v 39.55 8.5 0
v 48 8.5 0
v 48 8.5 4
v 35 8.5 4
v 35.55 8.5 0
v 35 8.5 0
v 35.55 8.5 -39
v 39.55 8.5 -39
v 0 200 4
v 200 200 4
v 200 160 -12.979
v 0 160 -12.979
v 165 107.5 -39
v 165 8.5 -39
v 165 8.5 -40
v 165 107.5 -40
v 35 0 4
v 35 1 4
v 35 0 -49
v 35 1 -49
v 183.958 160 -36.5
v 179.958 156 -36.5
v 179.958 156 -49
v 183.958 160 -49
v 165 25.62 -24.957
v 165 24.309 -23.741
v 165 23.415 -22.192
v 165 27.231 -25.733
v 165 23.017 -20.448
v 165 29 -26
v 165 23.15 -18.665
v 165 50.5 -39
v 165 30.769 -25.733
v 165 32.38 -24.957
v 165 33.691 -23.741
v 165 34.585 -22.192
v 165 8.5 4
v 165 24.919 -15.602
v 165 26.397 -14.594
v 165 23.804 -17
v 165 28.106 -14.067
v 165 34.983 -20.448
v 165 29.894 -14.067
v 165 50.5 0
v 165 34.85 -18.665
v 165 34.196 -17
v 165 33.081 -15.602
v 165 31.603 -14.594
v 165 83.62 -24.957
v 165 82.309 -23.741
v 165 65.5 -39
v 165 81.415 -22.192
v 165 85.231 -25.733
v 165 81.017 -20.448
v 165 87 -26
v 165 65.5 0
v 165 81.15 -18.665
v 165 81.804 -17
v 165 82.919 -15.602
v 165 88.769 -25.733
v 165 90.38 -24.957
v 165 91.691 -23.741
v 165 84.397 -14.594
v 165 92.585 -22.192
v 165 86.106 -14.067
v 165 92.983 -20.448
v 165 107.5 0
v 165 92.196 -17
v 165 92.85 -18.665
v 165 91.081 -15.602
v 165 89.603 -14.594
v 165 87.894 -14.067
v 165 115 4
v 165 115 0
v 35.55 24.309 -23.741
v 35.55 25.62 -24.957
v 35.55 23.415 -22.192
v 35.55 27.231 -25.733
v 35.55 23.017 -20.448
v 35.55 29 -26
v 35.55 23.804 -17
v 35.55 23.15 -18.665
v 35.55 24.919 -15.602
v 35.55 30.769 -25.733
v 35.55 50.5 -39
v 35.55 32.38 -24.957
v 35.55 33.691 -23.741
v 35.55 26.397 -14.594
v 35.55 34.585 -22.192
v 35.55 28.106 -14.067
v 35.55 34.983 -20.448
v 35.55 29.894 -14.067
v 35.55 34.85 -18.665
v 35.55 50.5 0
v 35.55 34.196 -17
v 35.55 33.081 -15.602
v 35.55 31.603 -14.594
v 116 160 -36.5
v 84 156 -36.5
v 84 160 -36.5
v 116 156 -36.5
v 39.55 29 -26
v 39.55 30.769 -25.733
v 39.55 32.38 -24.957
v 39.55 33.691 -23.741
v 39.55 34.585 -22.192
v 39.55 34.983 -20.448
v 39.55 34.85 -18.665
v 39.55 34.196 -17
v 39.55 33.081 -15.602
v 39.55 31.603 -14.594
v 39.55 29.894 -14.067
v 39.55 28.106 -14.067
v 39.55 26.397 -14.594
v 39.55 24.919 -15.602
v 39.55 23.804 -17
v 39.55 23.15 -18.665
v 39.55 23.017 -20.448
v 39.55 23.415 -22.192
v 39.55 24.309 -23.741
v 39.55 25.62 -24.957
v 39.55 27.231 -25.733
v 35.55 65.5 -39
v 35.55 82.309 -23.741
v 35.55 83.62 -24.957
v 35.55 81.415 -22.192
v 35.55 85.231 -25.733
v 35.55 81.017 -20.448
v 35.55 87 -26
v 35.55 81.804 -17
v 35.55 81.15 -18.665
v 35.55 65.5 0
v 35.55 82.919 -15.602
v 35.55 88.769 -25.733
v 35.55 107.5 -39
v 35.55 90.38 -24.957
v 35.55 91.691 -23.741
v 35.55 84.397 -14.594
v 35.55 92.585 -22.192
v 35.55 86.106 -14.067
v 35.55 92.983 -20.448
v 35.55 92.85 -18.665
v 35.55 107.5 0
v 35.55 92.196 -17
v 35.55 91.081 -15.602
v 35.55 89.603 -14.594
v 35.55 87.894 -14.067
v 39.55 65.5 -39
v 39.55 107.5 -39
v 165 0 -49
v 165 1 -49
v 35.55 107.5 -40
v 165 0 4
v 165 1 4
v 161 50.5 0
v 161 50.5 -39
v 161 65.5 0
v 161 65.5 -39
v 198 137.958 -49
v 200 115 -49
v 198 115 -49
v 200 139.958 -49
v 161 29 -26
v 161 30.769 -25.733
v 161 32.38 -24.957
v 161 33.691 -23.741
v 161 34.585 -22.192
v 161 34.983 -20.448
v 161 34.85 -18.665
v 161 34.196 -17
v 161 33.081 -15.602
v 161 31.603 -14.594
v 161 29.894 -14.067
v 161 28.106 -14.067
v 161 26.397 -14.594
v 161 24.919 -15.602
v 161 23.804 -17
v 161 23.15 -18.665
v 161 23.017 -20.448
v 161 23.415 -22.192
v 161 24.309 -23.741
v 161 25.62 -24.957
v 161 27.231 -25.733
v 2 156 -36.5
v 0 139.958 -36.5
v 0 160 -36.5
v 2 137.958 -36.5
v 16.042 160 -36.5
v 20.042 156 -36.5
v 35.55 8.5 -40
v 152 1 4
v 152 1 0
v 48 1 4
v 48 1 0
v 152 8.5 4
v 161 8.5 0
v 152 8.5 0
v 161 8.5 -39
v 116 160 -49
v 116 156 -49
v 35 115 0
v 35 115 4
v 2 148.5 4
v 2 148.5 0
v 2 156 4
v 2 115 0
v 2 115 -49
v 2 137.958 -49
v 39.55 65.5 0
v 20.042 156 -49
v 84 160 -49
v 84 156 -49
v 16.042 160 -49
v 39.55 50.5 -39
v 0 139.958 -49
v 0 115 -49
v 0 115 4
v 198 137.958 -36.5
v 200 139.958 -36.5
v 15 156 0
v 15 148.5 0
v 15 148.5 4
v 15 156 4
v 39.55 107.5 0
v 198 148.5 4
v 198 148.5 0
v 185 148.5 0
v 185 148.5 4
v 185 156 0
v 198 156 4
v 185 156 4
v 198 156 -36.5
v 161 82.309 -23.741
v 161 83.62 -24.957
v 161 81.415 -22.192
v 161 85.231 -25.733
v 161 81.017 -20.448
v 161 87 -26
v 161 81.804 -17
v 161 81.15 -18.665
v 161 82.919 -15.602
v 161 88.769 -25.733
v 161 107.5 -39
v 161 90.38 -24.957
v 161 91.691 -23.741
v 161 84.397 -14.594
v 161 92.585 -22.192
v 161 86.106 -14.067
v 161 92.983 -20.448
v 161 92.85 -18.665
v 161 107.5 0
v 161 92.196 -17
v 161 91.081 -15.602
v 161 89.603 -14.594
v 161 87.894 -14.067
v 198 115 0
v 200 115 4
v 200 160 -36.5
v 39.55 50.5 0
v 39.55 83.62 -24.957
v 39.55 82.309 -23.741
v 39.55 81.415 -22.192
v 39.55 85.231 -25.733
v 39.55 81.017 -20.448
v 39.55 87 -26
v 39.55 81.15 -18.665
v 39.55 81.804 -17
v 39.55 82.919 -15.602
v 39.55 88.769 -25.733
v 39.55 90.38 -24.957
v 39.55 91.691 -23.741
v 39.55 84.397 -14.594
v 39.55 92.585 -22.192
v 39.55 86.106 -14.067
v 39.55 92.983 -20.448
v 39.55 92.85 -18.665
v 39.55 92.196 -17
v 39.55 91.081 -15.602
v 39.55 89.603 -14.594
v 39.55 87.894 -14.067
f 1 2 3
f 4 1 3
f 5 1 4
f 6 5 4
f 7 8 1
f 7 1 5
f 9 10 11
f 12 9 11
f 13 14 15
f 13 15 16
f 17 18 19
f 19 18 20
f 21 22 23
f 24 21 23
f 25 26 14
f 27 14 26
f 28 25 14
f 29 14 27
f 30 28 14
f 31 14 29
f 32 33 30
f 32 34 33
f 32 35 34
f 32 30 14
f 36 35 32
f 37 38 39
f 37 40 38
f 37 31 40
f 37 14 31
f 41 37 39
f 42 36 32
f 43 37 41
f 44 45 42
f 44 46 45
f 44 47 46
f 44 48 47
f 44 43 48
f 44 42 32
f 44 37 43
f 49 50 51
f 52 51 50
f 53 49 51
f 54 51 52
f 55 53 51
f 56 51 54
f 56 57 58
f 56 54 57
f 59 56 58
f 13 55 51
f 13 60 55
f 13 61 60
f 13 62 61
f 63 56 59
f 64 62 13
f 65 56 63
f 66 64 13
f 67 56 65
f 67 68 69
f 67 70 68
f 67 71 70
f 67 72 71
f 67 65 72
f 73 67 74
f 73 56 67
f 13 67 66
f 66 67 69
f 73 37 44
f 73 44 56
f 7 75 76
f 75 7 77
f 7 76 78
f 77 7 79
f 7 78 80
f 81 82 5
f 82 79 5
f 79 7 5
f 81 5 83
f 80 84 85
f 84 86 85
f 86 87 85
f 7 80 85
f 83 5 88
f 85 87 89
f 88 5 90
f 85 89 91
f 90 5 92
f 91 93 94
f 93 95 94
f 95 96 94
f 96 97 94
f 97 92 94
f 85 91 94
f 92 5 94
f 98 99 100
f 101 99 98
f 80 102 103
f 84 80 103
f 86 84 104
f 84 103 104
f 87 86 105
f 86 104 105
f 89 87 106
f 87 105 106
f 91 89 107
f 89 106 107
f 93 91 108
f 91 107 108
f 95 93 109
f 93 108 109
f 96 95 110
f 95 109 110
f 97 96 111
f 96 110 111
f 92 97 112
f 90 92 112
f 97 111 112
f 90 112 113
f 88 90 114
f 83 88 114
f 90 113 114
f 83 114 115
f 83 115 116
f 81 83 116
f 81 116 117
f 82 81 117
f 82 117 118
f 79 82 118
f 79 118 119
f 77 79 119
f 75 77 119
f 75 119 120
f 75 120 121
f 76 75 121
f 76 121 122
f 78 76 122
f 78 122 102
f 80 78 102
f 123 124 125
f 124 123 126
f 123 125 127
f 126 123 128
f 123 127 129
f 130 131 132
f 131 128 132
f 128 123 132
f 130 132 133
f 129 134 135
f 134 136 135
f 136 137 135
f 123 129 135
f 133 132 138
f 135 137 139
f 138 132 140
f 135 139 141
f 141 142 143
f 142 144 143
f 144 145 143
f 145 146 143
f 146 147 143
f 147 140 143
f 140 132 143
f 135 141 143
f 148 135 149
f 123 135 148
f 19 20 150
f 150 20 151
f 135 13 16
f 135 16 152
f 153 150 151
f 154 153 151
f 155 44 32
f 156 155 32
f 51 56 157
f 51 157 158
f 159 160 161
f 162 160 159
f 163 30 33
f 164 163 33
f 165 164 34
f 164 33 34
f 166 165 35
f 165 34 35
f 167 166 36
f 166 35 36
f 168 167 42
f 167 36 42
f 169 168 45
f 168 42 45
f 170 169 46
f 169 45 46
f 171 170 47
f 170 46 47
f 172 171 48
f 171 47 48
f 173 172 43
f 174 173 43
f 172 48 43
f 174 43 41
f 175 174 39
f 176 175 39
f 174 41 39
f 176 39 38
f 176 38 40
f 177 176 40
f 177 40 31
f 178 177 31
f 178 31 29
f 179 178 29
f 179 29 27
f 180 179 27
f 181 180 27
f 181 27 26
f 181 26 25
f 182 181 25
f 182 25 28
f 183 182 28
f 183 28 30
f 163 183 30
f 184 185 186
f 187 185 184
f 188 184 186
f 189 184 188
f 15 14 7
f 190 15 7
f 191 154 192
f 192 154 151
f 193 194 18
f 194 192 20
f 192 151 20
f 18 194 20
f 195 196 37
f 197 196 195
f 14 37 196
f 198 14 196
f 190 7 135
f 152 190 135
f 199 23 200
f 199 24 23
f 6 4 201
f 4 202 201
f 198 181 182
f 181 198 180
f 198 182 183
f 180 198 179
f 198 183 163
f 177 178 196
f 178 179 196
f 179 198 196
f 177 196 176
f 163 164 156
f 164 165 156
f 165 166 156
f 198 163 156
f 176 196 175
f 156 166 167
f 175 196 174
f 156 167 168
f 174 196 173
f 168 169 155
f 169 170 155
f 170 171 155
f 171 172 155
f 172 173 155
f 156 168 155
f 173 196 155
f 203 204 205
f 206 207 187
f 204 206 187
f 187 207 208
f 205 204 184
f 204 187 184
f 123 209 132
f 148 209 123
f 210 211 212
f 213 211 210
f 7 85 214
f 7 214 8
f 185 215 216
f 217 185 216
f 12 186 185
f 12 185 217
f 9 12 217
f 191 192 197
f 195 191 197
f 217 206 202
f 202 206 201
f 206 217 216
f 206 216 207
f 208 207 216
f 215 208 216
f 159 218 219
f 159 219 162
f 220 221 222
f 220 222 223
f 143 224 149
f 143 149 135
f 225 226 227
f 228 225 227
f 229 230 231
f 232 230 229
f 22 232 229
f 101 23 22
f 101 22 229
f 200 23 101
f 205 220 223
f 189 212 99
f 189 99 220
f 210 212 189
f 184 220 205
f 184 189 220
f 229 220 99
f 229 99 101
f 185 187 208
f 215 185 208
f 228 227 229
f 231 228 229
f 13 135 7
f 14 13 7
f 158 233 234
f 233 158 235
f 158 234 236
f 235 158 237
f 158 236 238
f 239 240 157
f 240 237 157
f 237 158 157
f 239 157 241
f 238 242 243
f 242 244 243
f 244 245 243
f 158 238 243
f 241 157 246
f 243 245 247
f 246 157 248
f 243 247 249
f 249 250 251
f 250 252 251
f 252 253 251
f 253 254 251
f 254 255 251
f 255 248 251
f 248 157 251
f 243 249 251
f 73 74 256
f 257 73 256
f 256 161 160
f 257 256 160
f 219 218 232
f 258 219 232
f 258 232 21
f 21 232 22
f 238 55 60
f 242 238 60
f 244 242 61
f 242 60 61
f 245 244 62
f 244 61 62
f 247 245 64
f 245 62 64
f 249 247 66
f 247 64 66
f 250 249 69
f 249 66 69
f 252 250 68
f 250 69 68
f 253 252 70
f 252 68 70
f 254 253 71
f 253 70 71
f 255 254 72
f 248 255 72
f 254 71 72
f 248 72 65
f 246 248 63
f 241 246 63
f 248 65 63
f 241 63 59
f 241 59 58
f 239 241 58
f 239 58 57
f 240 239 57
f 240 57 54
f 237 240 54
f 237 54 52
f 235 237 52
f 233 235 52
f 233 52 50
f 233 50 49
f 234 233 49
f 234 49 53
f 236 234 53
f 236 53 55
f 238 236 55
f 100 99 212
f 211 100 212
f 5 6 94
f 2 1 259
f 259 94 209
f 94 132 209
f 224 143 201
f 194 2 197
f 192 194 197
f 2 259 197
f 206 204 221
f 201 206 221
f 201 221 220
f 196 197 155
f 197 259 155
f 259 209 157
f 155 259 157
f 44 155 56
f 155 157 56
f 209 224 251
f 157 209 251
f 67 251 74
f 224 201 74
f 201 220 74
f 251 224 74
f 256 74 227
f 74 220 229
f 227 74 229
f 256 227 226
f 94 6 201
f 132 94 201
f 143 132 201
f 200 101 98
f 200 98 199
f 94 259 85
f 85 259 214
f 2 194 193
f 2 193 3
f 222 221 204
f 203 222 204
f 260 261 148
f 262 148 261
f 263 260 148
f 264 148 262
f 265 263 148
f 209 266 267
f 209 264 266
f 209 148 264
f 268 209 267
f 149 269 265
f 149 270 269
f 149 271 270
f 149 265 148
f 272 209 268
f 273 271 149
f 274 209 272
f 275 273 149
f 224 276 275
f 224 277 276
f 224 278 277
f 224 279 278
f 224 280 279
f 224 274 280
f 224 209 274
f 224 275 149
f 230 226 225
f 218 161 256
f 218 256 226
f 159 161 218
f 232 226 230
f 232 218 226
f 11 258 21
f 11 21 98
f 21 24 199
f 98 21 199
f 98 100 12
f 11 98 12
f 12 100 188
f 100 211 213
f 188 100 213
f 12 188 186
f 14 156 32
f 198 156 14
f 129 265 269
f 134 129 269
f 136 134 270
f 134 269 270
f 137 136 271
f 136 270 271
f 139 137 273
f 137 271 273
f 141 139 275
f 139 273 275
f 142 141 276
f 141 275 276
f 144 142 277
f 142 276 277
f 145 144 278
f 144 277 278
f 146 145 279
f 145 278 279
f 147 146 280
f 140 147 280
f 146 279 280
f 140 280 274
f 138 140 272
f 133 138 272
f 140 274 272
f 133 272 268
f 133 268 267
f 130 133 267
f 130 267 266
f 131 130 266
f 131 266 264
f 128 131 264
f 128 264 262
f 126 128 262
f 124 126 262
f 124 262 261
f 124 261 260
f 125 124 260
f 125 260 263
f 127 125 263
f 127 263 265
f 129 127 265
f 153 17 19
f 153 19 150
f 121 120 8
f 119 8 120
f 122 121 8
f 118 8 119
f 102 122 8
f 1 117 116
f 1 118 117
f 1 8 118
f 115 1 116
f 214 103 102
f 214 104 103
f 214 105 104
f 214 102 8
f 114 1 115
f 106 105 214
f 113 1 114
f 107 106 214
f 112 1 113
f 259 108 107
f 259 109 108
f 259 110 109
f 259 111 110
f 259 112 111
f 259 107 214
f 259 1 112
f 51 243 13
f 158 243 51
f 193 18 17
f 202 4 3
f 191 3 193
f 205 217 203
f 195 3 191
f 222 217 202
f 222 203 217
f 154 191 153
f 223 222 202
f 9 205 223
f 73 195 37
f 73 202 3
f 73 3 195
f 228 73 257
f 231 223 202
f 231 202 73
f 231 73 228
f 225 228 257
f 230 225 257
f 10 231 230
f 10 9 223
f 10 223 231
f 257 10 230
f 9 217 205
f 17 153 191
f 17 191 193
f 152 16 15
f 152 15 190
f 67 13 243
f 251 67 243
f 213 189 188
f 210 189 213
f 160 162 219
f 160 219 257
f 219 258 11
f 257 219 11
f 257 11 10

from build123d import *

# Parameters (mm, degrees)
BOSS_EXTRUDE1_DEPTH     = 4
BOSS_EXTRUDE2_DEPTH     = 53
BOSS_EXTRUDE4_DEPTH     = 200
SKETCH5_W               = 25.514718625
SKETCH5_H               = 12.5
CUT_EXTRUDE1_DEPTH      = 20
SKETCH6_W               = 12.5
SKETCH6_H               = 25.514718626
CUT_EXTRUDE2_DEPTH      = 20
SKETCH7_W               = 32
SKETCH7_H               = 12.5
CUT_EXTRUDE3_DEPTH      = 8
CUT_EXTRUDE3_DEPTH_BACK = 6.482
BOSS_EXTRUDE5_DEPTH     = 4
SKETCH9_W               = 4
SKETCH9_H               = 99
BOSS_EXTRUDE6_DEPTH     = 39
SKETCH10_W              = 39
SKETCH10_H              = 15
CUT_EXTRUDE5_DEPTH      = 137
SKETCH12_W              = 35
SKETCH12_H              = 53
CUT_EXTRUDE6_DEPTH      = 8
SKETCH13_R              = 6
CUT_EXTRUDE7_DEPTH      = 135
SKETCH15_W              = 129.449663631
SKETCH15_H              = 99
BOSS_EXTRUDE7_DEPTH     = 1
SPLIT1_SURFACE_1_BACK   = 288.766
SPLIT1_SURFACE_1_DEPTH  = 577.532
SPLIT1_SURFACE_2_BACK   = 288.766
SPLIT1_SURFACE_2_DEPTH  = 577.532
SKETCH17_W              = 13
SKETCH17_H              = 7.5
CUT_EXTRUDE8_DEPTH      = 10


with BuildPart() as part:
    # Sketch1 → Boss-Extrude1 (new body)
    with BuildSketch(Plane.XY):
        Polygon((175.95836944, 160), (24.04163056, 160), (0, 135.95836944), (0, 115), (35, 115), (35, 60), (35, 55), (35, 0), (165, 0), (165, 55), (165, 60), (165, 115), (200, 115), (200, 135.95836944), align=None)
    extrude(amount=BOSS_EXTRUDE1_DEPTH)

    # Sketch3 → Boss-Extrude2 (add)
    with BuildSketch(Plane.XY.offset(4)):
        Polygon((0, 0), (200, 0), (200, 1), (199, 1), (1, 1), (0, 1), align=None)
        Polygon((0, 160), (200, 160), (200, 115), (198, 115), (198, 156), (2, 156), (2, 115), (0, 115), align=None)
    extrude(amount=-BOSS_EXTRUDE2_DEPTH)

    # Sketch4 → Boss-Extrude4 (add)
    with BuildSketch(Plane(origin=(200, 0, 0), x_dir=(0, 0, -1), z_dir=(1, 0, 0))):
        Polygon((-4, 160), (-4, 200), (12.978992648, 160), align=None)
    extrude(amount=-BOSS_EXTRUDE4_DEPTH)

    # Sketch5 → Cut-Extrude1 (cut)
    with BuildSketch(Plane(origin=(-67.97918472, 67.97918472, 0), x_dir=(0.7071067811865505, 0.7071067811865447, 0), z_dir=(-0.7071067811865447, 0.7071067811865505, 0))):
        with Locations((111.722871428, 42.75)):
            Rectangle(SKETCH5_W, SKETCH5_H)
    extrude(amount=CUT_EXTRUDE1_DEPTH, mode=Mode.SUBTRACT)

    # Sketch6 → Cut-Extrude2 (cut)
    with BuildSketch(Plane(origin=(167.97918472, 167.97918472, 0), x_dir=(0, 0, -1), z_dir=(0.7071067811865493, 0.7071067811865458, 0))):
        with Locations((42.75, -29.69848481)):
            Rectangle(SKETCH6_W, SKETCH6_H)
    extrude(amount=CUT_EXTRUDE2_DEPTH, mode=Mode.SUBTRACT)

    # Sketch7 → Cut-Extrude3 (cut, two sides)
    with BuildSketch(Plane(origin=(0, 155, 0), x_dir=(1, 0, 0), z_dir=(0, 1, 0))) as cut_extrude3_sk:
        with Locations((100, 42.75)):
            Rectangle(SKETCH7_W, SKETCH7_H)
    extrude(amount=CUT_EXTRUDE3_DEPTH, mode=Mode.SUBTRACT)
    extrude(cut_extrude3_sk.sketch, amount=-CUT_EXTRUDE3_DEPTH_BACK, mode=Mode.SUBTRACT)

    # Sketch8 → Boss-Extrude5 (add)
    with BuildSketch(Plane.XY.offset(4)):
        Polygon((20.04163056, 156), (2, 156), (2, 137.95836944), align=None)
        Polygon((179.95836944, 156), (198, 156), (198, 137.95836944), align=None)
    extrude(amount=-BOSS_EXTRUDE5_DEPTH)

    # Sketch9 → Boss-Extrude6 (add)
    with BuildSketch(Plane(origin=(0, 0, 0), x_dir=(-1, 0, 0), z_dir=(0, 0, -1))):
        with Locations((-37.550336369, 58)):
            Rectangle(SKETCH9_W, SKETCH9_H)
        with Locations((-163, 58)):
            Rectangle(SKETCH9_W, SKETCH9_H)
    extrude(amount=BOSS_EXTRUDE6_DEPTH)

    # Sketch10 → Cut-Extrude5 (cut)
    with BuildSketch(Plane(origin=(165, 0, 0), x_dir=(0, 0, -1), z_dir=(1, 0, 0))):
        with Locations((19.5, 58)):
            Rectangle(SKETCH10_W, SKETCH10_H)
    extrude(amount=-CUT_EXTRUDE5_DEPTH, mode=Mode.SUBTRACT)

    # Sketch12 → Cut-Extrude6 (cut)
    with BuildSketch(Plane(origin=(0, 1, 0), x_dir=(1, 0, 0), z_dir=(0, 1, 0))):
        with Locations((17.5, 22.5)):
            Rectangle(SKETCH12_W, SKETCH12_H)
        with Locations((182.5, 22.5)):
            Rectangle(SKETCH12_W, SKETCH12_H)
    extrude(amount=-CUT_EXTRUDE6_DEPTH, mode=Mode.SUBTRACT)

    # Sketch13 → Cut-Extrude7 (cut)
    with BuildSketch(Plane(origin=(165, 0, 0), x_dir=(0, 0, -1), z_dir=(1, 0, 0))):
        with Locations((20, 87)):
            Circle(SKETCH13_R)
        with Locations((20, 29)):
            Circle(SKETCH13_R)
    extrude(amount=-CUT_EXTRUDE7_DEPTH, mode=Mode.SUBTRACT)

    # Sketch15 → Boss-Extrude7 (add)
    with BuildSketch(Plane(origin=(0, 0, -39), x_dir=(-1, 0, 0), z_dir=(0, 0, -1))):
        with Locations((-100.275168185, 58)):
            Rectangle(SKETCH15_W, SKETCH15_H)
    extrude(amount=BOSS_EXTRUDE7_DEPTH)


with BuildPart() as body_2:
    # Split1: the piece behind the surface
    add(part.part)
    # Split1 surface: a surface, the sketch's curves swept straight by 577.532 mm
    with BuildLine(Plane(origin=(165, 0, 0), x_dir=(0, 0, -1), z_dir=(1, 0, 0)).offset(-SPLIT1_SURFACE_1_BACK), mode=Mode.PRIVATE) as split1_surface_1_path:
        Line((39, 107.5), (39, 8.5))
    split1_surface_1 = Shell.extrude(split1_surface_1_path.wire(), (1 * SPLIT1_SURFACE_1_DEPTH, 0 * SPLIT1_SURFACE_1_DEPTH, 0 * SPLIT1_SURFACE_1_DEPTH))
    split(bisect_by=split1_surface_1, keep=Keep.BOTTOM)

    # Sketch17 → Cut-Extrude8 (cut)
    with BuildSketch(Plane(origin=(0, 0, 0), x_dir=(-1, 0, 0), z_dir=(0, 0, -1))):
        with Locations((-191.5, 152.25)):
            Rectangle(SKETCH17_W, SKETCH17_H)
        with Locations((-8.5, 152.25)):
            Rectangle(SKETCH17_W, SKETCH17_H)
        with Locations((-158.5, 4.75)):
            Rectangle(SKETCH17_W, SKETCH17_H)
        with Locations((-41.5, 4.75)):
            Rectangle(SKETCH17_W, SKETCH17_H)
    extrude(amount=-CUT_EXTRUDE8_DEPTH, mode=Mode.SUBTRACT)


with BuildPart() as part_1:
    add(part.part)

    # Split1: split by a surface, the side it looks to stays
    # Split1 surface: a surface, the sketch's curves swept straight by 577.532 mm
    with BuildLine(Plane(origin=(165, 0, 0), x_dir=(0, 0, -1), z_dir=(1, 0, 0)).offset(-SPLIT1_SURFACE_2_BACK), mode=Mode.PRIVATE) as split1_surface_2_path:
        Line((39, 107.5), (39, 8.5))
    split1_surface_2 = Shell.extrude(split1_surface_2_path.wire(), (1 * SPLIT1_SURFACE_2_DEPTH, 0 * SPLIT1_SURFACE_2_DEPTH, 0 * SPLIT1_SURFACE_2_DEPTH))
    split(bisect_by=split1_surface_2, keep=Keep.TOP)


solid = Compound([body_2.part, part_1.part])
